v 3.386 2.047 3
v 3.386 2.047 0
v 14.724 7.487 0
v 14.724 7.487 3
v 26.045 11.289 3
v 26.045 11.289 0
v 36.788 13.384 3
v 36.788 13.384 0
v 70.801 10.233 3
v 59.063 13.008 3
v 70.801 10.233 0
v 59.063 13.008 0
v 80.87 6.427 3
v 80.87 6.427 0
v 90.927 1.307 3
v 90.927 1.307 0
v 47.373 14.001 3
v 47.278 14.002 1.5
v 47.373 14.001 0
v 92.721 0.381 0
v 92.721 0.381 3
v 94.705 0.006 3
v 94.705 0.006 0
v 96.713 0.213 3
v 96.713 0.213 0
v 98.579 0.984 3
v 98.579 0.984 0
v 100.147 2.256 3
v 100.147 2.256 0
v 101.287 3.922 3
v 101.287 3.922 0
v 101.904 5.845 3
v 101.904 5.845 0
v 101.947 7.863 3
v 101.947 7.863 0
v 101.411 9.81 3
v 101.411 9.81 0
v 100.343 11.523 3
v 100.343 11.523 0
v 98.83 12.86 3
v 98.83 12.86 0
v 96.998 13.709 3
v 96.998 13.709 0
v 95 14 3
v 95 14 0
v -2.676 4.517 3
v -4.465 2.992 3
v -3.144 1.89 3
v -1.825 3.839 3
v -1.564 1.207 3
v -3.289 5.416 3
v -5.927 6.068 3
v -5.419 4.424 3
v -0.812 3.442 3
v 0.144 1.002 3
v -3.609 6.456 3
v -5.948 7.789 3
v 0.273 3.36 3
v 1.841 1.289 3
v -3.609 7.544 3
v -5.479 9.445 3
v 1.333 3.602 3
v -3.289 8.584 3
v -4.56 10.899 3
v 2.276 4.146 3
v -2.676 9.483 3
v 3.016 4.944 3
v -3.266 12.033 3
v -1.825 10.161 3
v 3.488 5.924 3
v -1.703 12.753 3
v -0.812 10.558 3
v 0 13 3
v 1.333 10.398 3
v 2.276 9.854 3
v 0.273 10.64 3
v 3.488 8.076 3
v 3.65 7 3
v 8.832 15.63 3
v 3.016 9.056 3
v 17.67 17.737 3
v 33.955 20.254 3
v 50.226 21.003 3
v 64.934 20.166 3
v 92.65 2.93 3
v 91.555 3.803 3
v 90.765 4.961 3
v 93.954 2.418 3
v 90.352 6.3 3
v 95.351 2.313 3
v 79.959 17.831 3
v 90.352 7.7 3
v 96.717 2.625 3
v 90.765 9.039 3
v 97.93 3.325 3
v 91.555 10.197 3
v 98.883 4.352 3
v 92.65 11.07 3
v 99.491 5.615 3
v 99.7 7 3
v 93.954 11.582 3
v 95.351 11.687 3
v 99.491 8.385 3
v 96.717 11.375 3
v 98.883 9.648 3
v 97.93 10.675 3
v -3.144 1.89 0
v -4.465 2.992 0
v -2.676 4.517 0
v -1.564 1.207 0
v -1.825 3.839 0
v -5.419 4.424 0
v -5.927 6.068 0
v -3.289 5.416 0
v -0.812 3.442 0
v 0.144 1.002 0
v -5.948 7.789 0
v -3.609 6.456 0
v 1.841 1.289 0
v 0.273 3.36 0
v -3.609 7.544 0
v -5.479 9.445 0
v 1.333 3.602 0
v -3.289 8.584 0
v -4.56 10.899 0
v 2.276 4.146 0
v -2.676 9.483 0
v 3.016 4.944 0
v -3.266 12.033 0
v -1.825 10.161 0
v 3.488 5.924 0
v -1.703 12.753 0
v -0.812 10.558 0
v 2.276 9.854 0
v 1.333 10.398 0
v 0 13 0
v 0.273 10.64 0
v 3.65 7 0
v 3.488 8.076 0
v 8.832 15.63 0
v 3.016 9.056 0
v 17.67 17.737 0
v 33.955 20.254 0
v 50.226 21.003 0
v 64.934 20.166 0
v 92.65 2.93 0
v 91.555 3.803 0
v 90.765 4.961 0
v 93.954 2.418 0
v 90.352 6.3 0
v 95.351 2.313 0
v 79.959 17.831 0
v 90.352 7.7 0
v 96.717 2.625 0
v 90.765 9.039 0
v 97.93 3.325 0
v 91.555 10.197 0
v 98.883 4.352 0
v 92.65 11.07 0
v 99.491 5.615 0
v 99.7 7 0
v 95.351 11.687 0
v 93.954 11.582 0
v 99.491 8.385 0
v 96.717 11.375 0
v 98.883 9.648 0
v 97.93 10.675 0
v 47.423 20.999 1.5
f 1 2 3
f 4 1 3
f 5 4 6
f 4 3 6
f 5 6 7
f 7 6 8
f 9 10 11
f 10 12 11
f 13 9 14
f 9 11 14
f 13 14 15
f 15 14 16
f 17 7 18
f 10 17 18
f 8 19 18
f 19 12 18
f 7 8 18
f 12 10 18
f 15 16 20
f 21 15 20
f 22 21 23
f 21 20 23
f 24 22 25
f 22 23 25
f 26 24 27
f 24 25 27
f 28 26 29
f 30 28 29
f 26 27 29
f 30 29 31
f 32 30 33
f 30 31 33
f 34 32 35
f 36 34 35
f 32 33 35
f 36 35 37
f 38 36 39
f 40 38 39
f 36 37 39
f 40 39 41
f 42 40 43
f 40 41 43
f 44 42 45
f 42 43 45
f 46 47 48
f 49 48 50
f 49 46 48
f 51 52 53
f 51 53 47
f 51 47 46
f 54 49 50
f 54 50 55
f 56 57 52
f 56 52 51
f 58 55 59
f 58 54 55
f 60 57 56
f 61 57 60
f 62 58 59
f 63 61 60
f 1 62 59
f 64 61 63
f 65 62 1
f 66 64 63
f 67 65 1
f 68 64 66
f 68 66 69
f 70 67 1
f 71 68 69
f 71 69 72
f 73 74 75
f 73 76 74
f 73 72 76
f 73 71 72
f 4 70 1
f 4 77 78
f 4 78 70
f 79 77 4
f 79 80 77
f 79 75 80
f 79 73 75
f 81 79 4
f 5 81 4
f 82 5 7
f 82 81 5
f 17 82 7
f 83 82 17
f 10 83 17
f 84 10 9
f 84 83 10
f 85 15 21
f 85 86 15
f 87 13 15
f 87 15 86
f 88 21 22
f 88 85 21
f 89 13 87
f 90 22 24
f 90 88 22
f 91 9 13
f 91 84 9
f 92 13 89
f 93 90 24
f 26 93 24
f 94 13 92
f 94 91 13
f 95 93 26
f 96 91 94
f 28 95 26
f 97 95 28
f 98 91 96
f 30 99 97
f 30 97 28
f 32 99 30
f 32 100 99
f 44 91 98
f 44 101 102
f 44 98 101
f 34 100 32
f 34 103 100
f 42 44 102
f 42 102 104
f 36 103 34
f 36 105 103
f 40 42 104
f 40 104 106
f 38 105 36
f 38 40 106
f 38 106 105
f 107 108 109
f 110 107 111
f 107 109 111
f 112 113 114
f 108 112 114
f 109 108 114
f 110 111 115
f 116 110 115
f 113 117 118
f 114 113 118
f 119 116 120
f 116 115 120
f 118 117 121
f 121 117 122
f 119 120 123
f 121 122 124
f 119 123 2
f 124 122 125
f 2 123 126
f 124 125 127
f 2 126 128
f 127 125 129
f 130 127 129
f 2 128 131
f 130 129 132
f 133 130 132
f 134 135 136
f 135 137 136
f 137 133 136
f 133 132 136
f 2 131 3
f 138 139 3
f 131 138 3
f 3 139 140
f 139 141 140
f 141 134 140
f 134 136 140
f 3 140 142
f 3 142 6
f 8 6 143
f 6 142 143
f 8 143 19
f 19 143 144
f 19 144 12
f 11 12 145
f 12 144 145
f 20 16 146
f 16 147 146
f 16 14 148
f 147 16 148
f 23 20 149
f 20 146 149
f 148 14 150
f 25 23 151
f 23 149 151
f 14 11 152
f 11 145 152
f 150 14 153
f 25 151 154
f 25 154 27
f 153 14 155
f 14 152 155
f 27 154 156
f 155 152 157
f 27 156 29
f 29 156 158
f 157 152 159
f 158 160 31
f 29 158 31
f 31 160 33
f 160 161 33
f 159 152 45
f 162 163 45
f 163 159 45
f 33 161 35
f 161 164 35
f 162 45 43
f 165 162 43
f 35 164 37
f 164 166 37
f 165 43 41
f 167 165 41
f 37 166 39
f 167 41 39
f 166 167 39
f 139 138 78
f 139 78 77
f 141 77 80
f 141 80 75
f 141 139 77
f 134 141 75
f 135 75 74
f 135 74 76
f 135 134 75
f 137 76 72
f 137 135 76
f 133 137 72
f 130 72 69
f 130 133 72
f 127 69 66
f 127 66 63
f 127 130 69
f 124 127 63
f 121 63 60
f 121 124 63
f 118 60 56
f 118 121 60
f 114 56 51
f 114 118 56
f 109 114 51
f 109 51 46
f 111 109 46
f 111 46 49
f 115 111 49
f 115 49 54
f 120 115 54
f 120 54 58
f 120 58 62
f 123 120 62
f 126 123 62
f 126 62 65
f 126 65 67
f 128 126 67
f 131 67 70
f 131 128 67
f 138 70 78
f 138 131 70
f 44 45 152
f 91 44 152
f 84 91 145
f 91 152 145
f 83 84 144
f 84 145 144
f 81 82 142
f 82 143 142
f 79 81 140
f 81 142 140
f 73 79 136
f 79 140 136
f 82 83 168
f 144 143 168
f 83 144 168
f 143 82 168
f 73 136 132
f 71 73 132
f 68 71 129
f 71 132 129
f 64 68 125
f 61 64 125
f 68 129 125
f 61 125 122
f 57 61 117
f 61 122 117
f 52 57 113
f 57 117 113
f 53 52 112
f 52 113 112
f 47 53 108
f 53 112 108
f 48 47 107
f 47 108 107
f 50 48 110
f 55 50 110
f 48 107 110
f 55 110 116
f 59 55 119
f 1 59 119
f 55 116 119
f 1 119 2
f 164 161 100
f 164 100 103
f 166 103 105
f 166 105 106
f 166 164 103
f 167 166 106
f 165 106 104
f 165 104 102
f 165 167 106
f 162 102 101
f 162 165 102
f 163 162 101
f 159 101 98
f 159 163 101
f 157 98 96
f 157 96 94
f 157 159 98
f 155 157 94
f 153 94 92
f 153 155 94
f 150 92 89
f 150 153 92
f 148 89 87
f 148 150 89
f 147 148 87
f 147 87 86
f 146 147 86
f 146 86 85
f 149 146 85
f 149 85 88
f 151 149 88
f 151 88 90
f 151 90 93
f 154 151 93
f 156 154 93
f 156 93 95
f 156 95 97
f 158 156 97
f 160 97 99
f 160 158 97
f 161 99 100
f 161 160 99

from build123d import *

# Parameters (mm, degrees)
SKETCH_1_R      = 3.65
SKETCH_1_R_2    = 4.7
EXTRUDE_3_DEPTH = 3


with BuildPart() as part:
    # 草图1 → 凸台-拉伸3 (new body)
    with BuildSketch(Plane.XY):
        with BuildLine():
            ThreePointArc((90.926795434, 1.307109296), (101.665216985, 4.861102495), (95, 14))
            add(Edge.make_bspline(
                [(95, 14), (47.345961789, 28.498417982), (0, 13)],
                knots=[0.500810725, 0.500810725, 0.500810725, 1.500810725, 1.500810725, 1.500810725], degree=2))
            ThreePointArc((0, 13), (-5.732365711, 5.228000182), (3.385916999, 2.046661118))
            add(Edge.make_bspline(
                [(3.385916999, 2.046661118), (47.399803665, 26.327498122), (90.926795434, 1.307109296)],
                knots=[0, 0, 0, 1, 1, 1], degree=2))
        make_face()
        with Locations((0, 7)):
            Circle(SKETCH_1_R, mode=Mode.SUBTRACT)
        with Locations((95, 7)):
            Circle(SKETCH_1_R_2, mode=Mode.SUBTRACT)
    extrude(amount=EXTRUDE_3_DEPTH)


solid = part.part
